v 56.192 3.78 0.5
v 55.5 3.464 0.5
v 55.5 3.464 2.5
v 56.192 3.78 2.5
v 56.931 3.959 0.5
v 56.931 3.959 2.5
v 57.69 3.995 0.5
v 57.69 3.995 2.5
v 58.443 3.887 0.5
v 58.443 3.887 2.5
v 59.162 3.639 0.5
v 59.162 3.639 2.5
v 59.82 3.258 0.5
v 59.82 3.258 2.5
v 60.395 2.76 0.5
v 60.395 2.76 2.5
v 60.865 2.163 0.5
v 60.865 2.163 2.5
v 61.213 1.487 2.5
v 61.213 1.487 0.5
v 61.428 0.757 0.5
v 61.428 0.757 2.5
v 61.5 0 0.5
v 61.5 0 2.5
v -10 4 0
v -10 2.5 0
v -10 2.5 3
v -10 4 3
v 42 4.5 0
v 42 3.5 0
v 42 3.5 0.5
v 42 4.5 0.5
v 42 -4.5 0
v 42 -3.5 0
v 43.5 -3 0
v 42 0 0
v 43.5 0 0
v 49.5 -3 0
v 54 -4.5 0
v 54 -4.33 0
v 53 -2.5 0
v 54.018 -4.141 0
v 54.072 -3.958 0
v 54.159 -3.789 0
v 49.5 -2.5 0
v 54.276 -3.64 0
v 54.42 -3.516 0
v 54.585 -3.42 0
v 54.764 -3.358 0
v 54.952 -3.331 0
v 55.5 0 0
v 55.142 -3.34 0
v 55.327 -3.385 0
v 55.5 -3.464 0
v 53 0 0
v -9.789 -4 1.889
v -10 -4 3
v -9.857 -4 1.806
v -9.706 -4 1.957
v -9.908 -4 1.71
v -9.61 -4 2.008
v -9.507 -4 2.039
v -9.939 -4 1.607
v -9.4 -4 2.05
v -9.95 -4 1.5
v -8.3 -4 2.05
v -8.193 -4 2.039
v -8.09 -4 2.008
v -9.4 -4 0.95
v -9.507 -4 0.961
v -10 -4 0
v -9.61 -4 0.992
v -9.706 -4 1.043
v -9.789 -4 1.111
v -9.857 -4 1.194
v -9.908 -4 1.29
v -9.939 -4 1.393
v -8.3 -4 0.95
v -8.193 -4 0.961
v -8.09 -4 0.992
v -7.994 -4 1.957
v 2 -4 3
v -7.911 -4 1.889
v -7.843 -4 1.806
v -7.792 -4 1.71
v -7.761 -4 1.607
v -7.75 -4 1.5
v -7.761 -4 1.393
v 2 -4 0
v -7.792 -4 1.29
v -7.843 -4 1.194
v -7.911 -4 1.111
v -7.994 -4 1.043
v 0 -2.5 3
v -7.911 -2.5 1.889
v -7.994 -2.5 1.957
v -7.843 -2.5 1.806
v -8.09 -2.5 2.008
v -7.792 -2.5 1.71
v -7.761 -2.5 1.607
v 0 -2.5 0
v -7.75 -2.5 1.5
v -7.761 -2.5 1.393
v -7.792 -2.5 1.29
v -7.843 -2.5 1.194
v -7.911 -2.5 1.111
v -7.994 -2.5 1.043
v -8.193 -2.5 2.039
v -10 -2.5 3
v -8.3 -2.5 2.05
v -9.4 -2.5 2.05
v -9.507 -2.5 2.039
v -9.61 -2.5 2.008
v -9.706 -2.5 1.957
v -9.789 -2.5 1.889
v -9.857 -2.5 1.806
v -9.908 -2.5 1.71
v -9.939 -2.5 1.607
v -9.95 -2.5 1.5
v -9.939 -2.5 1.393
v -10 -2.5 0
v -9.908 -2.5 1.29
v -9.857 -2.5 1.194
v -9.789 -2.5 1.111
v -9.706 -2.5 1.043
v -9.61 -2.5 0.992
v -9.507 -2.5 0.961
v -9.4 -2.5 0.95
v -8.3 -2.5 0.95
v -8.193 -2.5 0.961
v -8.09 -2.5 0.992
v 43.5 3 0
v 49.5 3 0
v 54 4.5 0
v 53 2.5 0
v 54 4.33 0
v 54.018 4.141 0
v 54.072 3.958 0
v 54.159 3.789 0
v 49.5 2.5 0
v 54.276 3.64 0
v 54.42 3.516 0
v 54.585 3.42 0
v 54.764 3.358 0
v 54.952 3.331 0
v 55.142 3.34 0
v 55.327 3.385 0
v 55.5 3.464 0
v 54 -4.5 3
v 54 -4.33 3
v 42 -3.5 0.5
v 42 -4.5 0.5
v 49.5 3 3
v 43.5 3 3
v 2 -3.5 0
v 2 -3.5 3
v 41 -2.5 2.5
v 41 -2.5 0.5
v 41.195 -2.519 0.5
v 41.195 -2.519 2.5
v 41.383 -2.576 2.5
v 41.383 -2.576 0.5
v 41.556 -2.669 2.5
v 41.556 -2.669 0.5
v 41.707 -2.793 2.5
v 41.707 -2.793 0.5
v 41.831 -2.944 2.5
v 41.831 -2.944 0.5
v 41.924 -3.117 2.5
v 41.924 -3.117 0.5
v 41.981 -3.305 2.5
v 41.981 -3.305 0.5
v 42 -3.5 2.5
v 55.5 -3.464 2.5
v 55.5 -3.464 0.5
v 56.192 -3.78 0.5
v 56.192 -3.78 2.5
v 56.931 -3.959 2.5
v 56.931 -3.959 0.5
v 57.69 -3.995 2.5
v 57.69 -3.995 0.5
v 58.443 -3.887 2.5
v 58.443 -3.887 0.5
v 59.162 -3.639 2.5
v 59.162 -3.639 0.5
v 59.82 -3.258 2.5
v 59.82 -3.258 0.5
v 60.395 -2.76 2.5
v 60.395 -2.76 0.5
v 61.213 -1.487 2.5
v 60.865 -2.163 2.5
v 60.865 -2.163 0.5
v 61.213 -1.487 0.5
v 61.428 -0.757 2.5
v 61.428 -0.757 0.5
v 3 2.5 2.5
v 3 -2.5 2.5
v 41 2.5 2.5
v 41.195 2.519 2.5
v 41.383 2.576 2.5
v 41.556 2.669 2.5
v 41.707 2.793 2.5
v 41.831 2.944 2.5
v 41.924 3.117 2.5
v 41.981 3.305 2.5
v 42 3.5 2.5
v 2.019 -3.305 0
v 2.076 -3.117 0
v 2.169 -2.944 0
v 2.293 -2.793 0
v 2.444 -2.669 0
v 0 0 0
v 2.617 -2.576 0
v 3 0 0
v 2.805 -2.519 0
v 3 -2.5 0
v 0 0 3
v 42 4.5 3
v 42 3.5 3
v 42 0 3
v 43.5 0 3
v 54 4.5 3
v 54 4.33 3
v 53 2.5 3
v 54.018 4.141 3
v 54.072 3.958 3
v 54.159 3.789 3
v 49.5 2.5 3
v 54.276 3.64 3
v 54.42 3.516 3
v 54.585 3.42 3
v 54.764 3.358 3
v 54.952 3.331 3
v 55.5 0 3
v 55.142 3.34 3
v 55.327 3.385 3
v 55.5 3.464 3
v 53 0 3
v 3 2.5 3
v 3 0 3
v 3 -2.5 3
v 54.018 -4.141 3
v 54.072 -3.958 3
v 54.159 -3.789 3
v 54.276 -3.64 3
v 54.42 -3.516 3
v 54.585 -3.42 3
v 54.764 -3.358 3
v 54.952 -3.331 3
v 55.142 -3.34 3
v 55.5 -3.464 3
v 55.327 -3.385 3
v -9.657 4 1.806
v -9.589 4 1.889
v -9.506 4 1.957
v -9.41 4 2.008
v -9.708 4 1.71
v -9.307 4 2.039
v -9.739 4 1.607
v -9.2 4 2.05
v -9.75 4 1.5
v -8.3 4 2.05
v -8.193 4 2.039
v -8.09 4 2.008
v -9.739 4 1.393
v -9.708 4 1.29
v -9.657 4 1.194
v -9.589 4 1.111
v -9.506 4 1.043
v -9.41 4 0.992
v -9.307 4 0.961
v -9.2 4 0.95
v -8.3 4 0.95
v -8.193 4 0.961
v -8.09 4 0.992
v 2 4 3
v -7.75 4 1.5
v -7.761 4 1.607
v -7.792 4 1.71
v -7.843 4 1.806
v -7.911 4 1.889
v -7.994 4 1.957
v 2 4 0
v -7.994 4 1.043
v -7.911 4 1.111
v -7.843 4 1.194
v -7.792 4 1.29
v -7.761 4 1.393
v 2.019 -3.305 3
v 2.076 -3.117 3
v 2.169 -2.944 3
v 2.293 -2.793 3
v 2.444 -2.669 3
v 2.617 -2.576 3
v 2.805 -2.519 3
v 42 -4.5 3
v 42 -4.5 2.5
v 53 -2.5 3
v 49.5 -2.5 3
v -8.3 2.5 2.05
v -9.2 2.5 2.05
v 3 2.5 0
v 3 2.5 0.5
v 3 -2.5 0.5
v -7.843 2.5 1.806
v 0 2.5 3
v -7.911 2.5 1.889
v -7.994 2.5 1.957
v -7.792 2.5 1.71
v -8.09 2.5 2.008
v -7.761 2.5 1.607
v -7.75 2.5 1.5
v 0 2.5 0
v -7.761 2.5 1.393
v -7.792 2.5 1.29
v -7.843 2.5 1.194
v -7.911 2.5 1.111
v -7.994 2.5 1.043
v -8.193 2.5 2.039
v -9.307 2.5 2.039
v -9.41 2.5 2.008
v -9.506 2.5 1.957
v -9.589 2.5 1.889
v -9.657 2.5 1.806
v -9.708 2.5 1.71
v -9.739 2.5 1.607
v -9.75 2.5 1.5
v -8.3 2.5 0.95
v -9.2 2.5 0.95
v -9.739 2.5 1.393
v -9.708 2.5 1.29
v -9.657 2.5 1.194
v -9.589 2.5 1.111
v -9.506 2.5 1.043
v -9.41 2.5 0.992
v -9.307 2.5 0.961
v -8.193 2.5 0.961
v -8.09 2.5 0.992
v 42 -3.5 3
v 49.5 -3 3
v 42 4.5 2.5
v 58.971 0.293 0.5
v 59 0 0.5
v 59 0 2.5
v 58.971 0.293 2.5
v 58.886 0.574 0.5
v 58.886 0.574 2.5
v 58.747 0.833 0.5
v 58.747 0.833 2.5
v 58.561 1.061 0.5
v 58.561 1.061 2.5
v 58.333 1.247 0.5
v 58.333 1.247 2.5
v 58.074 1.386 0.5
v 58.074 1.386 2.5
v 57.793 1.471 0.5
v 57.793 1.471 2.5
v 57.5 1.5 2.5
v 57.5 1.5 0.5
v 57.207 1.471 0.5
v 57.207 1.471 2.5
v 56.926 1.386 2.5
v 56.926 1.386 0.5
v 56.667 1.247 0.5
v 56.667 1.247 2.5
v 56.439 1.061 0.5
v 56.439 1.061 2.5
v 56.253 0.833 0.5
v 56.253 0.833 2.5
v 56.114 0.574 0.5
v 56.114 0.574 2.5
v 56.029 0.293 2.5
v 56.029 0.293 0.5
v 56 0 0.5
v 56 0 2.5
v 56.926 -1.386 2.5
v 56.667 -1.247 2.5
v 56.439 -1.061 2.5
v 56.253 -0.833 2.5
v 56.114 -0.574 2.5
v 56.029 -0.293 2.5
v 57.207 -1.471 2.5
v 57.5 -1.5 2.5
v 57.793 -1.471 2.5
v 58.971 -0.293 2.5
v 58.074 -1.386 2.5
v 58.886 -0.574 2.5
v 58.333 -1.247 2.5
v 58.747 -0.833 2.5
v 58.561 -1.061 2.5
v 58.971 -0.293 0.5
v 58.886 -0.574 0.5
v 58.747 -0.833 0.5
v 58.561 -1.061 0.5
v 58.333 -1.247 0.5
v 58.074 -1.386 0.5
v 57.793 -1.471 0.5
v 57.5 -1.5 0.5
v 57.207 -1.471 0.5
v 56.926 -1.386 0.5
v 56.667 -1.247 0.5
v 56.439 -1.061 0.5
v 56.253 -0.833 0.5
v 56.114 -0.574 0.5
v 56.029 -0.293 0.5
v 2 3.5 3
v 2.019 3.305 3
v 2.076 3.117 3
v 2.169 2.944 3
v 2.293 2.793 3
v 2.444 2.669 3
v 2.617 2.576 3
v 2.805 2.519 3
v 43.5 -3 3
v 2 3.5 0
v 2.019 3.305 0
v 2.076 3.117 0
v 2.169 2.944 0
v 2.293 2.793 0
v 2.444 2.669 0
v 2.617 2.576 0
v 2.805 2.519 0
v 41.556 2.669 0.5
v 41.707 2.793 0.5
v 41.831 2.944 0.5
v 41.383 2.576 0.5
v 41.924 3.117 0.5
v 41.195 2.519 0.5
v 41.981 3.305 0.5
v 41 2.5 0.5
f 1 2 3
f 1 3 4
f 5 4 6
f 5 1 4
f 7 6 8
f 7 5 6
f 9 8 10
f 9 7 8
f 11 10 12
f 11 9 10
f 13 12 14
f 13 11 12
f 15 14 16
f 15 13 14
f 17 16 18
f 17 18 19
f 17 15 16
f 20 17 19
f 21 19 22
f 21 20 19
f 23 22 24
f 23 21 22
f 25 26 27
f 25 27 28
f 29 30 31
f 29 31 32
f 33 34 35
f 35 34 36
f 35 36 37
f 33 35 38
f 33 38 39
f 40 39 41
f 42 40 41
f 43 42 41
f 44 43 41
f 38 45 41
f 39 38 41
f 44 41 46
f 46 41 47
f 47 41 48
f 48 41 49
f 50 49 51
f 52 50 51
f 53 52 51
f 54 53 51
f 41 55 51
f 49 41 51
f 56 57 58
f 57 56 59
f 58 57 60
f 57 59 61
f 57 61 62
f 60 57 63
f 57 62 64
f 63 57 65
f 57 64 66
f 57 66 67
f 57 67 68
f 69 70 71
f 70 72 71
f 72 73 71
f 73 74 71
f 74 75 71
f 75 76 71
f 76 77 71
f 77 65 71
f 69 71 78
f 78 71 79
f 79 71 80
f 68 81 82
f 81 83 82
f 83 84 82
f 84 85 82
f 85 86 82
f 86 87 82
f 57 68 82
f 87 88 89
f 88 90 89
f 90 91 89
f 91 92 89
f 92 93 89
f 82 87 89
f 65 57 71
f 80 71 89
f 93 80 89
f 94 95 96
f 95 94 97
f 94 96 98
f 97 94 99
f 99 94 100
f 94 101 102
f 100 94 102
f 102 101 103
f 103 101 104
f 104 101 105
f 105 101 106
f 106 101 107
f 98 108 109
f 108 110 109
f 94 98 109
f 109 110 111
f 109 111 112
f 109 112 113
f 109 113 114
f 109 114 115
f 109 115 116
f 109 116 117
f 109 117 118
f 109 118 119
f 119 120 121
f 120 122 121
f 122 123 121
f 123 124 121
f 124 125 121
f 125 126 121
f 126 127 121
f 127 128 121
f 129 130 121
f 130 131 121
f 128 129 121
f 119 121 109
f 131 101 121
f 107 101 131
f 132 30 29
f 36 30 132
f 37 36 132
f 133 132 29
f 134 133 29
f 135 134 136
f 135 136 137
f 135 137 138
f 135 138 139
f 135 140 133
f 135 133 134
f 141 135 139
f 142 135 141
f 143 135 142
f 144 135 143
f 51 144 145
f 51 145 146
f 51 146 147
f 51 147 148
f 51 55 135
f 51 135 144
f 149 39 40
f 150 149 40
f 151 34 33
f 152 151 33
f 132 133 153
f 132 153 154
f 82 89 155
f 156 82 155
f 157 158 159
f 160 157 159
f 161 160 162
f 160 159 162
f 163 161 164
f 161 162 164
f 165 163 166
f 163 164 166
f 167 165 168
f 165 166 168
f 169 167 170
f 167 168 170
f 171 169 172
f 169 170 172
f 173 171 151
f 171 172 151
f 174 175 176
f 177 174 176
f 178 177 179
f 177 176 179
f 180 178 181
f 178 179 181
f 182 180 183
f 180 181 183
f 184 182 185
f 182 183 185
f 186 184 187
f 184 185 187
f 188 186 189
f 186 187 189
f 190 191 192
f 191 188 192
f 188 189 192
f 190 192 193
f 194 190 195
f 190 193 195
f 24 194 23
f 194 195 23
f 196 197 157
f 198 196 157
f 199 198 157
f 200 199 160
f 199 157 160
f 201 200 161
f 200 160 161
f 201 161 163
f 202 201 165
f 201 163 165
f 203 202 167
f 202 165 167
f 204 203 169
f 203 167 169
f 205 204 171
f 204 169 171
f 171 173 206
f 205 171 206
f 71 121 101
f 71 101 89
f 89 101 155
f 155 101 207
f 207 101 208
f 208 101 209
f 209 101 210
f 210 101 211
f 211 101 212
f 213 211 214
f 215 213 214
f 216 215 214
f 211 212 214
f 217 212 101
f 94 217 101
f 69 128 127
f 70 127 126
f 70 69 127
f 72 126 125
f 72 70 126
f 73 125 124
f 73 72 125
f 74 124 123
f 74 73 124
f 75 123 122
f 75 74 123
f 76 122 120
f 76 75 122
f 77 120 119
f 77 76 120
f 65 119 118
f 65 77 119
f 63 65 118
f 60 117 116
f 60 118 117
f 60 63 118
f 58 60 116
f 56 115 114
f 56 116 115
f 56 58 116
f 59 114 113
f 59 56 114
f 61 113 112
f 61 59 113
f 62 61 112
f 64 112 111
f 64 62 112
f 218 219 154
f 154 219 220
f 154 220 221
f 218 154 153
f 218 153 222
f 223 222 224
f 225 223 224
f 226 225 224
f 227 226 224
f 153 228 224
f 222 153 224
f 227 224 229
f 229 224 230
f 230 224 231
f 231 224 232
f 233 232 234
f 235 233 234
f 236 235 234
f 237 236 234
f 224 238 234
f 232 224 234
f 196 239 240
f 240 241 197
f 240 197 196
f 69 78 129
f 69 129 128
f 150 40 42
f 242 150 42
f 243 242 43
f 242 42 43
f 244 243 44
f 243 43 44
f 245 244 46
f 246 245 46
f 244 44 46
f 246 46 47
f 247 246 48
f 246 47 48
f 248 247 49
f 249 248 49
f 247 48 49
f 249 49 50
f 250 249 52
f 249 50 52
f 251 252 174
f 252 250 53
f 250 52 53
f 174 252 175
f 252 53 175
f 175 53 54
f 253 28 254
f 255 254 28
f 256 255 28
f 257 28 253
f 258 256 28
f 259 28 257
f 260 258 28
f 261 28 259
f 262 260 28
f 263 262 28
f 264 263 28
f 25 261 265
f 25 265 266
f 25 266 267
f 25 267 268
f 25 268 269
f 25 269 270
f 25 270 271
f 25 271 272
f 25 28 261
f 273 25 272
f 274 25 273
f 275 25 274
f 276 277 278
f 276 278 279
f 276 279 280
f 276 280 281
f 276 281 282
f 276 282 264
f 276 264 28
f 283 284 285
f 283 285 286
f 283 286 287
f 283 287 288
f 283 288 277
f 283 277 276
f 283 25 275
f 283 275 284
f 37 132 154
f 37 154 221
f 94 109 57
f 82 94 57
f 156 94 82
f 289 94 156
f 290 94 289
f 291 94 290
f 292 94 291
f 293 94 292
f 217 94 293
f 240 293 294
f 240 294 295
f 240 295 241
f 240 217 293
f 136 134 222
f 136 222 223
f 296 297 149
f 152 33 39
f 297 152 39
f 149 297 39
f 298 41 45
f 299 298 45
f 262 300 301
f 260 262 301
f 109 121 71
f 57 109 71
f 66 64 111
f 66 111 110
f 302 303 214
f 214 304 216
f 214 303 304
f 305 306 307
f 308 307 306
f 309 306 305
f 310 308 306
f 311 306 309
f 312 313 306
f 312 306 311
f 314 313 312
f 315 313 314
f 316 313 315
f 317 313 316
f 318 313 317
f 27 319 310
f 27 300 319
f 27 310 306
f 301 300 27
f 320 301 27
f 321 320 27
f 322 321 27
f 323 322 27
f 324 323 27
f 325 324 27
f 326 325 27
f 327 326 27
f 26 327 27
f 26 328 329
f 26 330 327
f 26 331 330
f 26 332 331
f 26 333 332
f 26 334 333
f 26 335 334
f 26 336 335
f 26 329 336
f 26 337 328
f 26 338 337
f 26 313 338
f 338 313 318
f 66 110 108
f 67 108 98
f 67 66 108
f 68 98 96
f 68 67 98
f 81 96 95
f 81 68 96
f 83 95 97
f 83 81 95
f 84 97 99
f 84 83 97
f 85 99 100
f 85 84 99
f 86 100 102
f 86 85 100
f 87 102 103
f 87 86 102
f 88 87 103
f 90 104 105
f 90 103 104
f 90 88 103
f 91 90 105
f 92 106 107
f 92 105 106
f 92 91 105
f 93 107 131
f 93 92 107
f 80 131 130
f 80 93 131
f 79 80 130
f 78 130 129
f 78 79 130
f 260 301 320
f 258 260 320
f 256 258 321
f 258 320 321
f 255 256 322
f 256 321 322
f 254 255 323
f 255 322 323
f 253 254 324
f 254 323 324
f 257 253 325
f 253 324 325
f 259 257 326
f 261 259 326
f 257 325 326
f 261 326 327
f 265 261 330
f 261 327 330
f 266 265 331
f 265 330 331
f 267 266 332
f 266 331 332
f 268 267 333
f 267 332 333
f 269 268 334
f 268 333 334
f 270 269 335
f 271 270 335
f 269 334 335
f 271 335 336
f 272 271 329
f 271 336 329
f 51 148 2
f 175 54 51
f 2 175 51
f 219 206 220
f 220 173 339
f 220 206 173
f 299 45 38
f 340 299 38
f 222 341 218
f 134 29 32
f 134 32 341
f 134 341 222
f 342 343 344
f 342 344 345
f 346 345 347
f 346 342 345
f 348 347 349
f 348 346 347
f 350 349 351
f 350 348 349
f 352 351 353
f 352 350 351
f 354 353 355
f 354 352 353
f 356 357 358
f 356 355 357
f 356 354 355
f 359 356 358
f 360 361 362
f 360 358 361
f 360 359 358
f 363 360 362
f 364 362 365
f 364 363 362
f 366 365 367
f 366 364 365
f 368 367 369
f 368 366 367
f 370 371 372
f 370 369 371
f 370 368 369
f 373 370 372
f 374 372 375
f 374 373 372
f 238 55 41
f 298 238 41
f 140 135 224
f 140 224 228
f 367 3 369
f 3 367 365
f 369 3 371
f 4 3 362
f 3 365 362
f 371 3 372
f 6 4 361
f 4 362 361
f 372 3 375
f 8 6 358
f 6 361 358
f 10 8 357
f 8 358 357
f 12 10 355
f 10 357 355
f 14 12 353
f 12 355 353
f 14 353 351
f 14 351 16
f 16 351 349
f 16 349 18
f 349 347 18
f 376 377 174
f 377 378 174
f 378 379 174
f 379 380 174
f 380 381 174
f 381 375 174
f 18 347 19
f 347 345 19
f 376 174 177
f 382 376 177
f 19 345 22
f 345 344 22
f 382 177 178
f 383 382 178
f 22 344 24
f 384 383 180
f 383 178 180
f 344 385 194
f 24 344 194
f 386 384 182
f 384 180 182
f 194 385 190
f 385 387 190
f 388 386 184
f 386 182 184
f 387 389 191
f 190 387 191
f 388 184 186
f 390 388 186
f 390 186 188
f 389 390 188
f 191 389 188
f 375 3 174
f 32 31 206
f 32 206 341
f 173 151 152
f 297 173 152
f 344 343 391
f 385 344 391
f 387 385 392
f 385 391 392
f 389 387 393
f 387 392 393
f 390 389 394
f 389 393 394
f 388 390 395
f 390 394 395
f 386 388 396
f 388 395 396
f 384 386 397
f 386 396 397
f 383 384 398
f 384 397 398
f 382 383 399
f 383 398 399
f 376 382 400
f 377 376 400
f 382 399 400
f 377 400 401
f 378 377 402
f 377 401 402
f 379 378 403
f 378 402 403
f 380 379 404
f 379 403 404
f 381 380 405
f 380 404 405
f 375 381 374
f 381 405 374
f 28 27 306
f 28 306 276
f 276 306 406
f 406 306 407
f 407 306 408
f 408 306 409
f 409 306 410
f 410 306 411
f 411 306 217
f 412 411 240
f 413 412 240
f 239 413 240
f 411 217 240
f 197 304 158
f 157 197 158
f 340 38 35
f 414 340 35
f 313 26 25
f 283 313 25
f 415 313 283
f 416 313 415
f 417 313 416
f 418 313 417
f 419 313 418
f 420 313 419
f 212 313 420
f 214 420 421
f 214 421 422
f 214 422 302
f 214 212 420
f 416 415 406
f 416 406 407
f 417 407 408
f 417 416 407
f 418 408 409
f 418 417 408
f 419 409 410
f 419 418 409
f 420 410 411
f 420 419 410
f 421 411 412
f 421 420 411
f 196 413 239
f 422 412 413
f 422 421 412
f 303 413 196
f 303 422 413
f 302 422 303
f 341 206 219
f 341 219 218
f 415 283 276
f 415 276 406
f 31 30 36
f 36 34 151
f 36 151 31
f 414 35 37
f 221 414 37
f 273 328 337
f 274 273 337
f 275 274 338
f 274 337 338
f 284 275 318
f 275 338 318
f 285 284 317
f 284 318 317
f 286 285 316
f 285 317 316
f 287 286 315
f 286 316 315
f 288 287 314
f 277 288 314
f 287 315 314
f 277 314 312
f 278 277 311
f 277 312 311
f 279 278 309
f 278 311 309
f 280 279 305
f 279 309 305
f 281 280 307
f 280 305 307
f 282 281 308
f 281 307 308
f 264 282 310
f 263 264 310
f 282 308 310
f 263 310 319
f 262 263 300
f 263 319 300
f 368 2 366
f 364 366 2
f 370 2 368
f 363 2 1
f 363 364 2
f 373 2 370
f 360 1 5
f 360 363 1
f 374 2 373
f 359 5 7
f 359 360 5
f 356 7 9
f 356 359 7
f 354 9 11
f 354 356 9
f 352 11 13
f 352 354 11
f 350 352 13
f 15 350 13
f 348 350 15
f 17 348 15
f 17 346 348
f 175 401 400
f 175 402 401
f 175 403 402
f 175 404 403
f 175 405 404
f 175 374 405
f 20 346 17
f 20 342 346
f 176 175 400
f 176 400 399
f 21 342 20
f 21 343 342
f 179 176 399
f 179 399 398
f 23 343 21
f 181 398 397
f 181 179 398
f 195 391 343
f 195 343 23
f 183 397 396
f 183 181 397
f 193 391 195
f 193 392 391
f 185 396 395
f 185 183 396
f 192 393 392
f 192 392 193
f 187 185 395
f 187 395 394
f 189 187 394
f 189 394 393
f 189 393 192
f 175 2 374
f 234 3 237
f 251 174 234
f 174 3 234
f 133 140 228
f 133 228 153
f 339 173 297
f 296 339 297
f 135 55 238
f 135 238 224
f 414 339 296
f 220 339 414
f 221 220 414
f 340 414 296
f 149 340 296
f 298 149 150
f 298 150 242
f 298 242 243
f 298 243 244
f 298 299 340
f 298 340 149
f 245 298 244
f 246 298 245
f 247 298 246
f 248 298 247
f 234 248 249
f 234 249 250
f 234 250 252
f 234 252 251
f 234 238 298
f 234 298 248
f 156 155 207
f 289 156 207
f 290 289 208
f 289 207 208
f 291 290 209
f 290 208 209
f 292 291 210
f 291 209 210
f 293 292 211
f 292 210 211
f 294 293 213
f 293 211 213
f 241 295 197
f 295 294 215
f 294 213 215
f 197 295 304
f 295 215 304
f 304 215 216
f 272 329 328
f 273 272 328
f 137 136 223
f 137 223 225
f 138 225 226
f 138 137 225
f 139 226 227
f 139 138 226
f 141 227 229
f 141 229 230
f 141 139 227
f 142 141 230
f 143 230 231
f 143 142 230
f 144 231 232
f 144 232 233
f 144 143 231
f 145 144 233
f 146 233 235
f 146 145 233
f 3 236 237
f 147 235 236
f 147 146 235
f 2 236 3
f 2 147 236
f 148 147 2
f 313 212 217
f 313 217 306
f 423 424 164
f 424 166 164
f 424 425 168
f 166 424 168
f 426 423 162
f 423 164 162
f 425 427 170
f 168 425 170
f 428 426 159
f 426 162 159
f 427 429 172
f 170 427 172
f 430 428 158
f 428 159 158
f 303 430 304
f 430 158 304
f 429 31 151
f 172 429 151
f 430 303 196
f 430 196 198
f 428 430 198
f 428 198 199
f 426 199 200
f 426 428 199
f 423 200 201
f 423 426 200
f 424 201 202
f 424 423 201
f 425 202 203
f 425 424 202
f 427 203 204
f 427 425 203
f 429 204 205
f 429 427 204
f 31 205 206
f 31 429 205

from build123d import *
from build123d.topology import SkipClean

# Parameters (mm, degrees)
BOSS_EXTRU_3_DEPTH           = 3
ENL_V_MAT_EXTRU_1_DEPTH      = 63.157059132
ENL_V_MAT_EXTRU_1_DEPTH_BACK = 3
ENL_V_MAT_EXTRU_2_DEPTH      = 3
ESQUISSE5_W                  = 6
ESQUISSE5_H                  = 0.5
ENL_V_MAT_EXTRU_4_DEPTH      = 63.227405538


with BuildPart() as part:
    # Esquisse1 → Boss.-Extru.3 (new body)
    with BuildSketch(Plane.XY):
        with BuildLine():
            Line((43.5, 0), (0, 0))
            Line((0, 0), (0, -2.5))
            Line((0, -2.5), (-10, -2.5))
            Line((-10, -2.5), (-10, -4))
            Line((-10, -4), (2, -4))
            Line((2, -4), (2, -3.5))
            ThreePointArc((2, -3.5), (2.292893219, -2.792893219), (3, -2.5))
            Line((3, -2.5), (41, -2.5))
            ThreePointArc((41, -2.5), (41.707106781, -2.792893219), (42, -3.5))
            Line((42, -3.5), (42, -4.5))
            Line((42, -4.5), (54, -4.5))
            Line((54, -4.5), (54, -4.330127019))
            ThreePointArc((54, -4.330127019), (54.5, -3.464101615), (55.5, -3.464101615))
            ThreePointArc((55.5, -3.464101615), (59.5, -3.464101615), (61.5, 0))
            Line((61.5, 0), (59, 0))
            ThreePointArc((59, 0), (57.5, -1.5), (56, 0))
            Line((56, 0), (53, 0))
            Line((53, 0), (53, -2.5))
            Line((53, -2.5), (49.5, -2.5))
            Line((49.5, -2.5), (49.5, -3))
            Line((49.5, -3), (43.5, -3))
            Line((43.5, -3), (43.5, 0))
        make_face()
    boss_extru_3 = extrude(amount=BOSS_EXTRU_3_DEPTH)

    # Symétrie2: Boss.-Extru.3 across plane
    with SkipClean():  # the faces are left unmerged after this step: merging them gives an invalid solid
        add(boss_extru_3.mirror(Plane(origin=(0, 0, 3), x_dir=(0, 0, 1), z_dir=(0, 1, 0))))

    # Esquisse2 → Enlèv. mat.-Extru.1 (cut, two sides: drawn at the far end of the back side and taken through both)
    with SkipClean():  # the faces are left unmerged after this step: merging them gives an invalid solid
        with BuildSketch(Plane(origin=(0, 4, 0), x_dir=(1, 0, 0), z_dir=(0, 1, 0)).offset(-ENL_V_MAT_EXTRU_1_DEPTH_BACK)):
            with BuildLine():
                Line((-9.2, -0.95), (-8.3, -0.95))
                ThreePointArc((-8.3, -0.95), (-7.75, -1.5), (-8.3, -2.05))
                Line((-8.3, -2.05), (-9.2, -2.05))
                ThreePointArc((-9.2, -2.05), (-9.75, -1.5), (-9.2, -0.95))
            make_face()
        extrude(amount=ENL_V_MAT_EXTRU_1_DEPTH + ENL_V_MAT_EXTRU_1_DEPTH_BACK, mode=Mode.SUBTRACT)

    # Esquisse3 → Enlèv. mat.-Extru.2 (cut)
    with SkipClean():  # the faces are left unmerged after this step: merging them gives an invalid solid
        with BuildSketch(Plane.XZ.offset(4)):
            with BuildLine():
                Line((-9.4, 2.05), (-8.3, 2.05))
                ThreePointArc((-8.3, 2.05), (-7.75, 1.5), (-8.3, 0.95))
                Line((-8.3, 0.95), (-9.4, 0.95))
                ThreePointArc((-9.4, 0.95), (-9.95, 1.5), (-9.4, 2.05))
            make_face()
        extrude(amount=-ENL_V_MAT_EXTRU_2_DEPTH, mode=Mode.SUBTRACT)

    # Esquisse5 → Enlèv. mat.-Extru.4 (cut, through all)
    with SkipClean():  # the faces are left unmerged after this step: merging them gives an invalid solid
        with BuildSketch(Plane.XZ.offset(4.5)):
            Polygon((42, 2.5), (42, 3), (3, 3), (3, 2.5), (41, 2.5), align=None)
            Polygon((3, 0), (42, 0), (42, 0.5), (41, 0.5), (3, 0.5), align=None)
            with Locations((58.5, 2.75)):
                Rectangle(ESQUISSE5_W, ESQUISSE5_H)
            with Locations((58.5, 0.25)):
                Rectangle(ESQUISSE5_W, ESQUISSE5_H)
        extrude(amount=-ENL_V_MAT_EXTRU_4_DEPTH, mode=Mode.SUBTRACT)


solid = part.part
